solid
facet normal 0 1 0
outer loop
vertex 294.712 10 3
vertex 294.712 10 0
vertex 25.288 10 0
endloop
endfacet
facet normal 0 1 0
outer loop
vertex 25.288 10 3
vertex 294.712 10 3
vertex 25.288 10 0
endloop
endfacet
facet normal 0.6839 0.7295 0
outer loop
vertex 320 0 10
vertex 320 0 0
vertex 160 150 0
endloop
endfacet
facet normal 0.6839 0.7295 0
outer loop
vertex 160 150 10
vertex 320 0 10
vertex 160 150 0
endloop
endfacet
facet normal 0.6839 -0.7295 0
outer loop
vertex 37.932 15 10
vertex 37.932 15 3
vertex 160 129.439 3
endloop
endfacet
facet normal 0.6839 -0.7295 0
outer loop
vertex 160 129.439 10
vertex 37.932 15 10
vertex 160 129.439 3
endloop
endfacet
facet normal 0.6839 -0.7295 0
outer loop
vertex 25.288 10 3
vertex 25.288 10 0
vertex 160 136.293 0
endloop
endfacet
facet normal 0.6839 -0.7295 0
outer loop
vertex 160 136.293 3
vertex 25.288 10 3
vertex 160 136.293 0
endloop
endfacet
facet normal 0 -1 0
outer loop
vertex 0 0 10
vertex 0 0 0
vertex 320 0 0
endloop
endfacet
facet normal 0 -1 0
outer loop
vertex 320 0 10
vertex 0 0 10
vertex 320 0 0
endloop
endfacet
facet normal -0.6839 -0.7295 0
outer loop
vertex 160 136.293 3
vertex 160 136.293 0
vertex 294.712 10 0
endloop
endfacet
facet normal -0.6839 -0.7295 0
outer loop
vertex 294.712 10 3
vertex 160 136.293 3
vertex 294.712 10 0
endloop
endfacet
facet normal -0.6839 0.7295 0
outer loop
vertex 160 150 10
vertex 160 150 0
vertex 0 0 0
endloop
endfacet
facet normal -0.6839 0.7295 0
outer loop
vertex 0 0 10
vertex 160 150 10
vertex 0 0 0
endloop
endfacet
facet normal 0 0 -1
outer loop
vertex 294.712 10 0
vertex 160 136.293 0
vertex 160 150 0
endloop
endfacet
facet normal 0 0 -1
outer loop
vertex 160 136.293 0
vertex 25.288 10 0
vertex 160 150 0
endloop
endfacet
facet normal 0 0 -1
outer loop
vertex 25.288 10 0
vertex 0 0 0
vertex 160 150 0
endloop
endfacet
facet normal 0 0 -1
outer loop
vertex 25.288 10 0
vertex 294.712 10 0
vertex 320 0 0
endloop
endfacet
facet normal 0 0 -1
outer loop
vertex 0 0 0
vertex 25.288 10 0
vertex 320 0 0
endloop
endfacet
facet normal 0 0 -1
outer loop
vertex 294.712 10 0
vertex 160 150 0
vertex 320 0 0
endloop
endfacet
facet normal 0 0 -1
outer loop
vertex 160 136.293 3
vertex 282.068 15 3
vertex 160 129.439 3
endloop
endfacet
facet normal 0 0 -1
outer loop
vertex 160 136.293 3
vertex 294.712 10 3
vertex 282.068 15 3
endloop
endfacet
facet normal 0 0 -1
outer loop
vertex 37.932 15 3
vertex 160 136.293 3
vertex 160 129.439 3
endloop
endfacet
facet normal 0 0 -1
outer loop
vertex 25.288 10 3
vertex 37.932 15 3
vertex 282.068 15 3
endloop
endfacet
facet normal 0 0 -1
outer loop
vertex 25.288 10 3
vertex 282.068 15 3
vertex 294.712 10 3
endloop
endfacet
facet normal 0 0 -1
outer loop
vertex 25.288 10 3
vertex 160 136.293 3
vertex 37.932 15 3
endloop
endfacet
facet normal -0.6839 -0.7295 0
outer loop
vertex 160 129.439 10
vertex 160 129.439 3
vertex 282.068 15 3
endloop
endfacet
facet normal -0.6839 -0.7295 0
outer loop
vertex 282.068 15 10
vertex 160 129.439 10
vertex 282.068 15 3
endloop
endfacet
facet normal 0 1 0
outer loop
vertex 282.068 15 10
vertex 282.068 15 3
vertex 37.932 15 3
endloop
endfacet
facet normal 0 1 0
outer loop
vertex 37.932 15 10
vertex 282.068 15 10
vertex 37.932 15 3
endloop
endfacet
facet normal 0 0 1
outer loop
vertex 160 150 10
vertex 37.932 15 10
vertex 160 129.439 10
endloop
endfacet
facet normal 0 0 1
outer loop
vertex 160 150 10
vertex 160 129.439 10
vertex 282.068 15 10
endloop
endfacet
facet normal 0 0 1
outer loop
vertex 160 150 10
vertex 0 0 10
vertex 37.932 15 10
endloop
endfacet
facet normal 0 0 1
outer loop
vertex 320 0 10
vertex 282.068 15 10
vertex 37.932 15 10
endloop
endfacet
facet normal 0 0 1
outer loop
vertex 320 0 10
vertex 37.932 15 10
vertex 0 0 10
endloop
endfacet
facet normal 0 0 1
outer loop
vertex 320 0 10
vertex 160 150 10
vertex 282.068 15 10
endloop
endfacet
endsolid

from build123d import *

# Parameters (mm, degrees)
SALIENTE_EXTRUIR1_DEPTH = 10
CORTAR_EXTRUIR1_DEPTH   = 3


with BuildPart() as part:
    # Croquis1 → Saliente-Extruir1 (new body)
    with BuildSketch(Plane.XY):
        Polygon((0, 0), (320, 0), (160, 150), align=None)
        Polygon((160, 129.439019813), (282.068287801, 15), (37.931712199, 15), align=None, mode=Mode.SUBTRACT)
    extrude(amount=SALIENTE_EXTRUIR1_DEPTH)

    # Croquis2 → Cortar-Extruir1 (cut)
    with BuildSketch(Plane(origin=(0, 0, 0), x_dir=(-1, 0, 0), z_dir=(0, 0, -1))):
        Polygon((-294.712191867, 10), (-25.287808133, 10), (-160, 136.292679875), align=None)
    extrude(amount=-CORTAR_EXTRUIR1_DEPTH, mode=Mode.SUBTRACT)


solid = part.part
